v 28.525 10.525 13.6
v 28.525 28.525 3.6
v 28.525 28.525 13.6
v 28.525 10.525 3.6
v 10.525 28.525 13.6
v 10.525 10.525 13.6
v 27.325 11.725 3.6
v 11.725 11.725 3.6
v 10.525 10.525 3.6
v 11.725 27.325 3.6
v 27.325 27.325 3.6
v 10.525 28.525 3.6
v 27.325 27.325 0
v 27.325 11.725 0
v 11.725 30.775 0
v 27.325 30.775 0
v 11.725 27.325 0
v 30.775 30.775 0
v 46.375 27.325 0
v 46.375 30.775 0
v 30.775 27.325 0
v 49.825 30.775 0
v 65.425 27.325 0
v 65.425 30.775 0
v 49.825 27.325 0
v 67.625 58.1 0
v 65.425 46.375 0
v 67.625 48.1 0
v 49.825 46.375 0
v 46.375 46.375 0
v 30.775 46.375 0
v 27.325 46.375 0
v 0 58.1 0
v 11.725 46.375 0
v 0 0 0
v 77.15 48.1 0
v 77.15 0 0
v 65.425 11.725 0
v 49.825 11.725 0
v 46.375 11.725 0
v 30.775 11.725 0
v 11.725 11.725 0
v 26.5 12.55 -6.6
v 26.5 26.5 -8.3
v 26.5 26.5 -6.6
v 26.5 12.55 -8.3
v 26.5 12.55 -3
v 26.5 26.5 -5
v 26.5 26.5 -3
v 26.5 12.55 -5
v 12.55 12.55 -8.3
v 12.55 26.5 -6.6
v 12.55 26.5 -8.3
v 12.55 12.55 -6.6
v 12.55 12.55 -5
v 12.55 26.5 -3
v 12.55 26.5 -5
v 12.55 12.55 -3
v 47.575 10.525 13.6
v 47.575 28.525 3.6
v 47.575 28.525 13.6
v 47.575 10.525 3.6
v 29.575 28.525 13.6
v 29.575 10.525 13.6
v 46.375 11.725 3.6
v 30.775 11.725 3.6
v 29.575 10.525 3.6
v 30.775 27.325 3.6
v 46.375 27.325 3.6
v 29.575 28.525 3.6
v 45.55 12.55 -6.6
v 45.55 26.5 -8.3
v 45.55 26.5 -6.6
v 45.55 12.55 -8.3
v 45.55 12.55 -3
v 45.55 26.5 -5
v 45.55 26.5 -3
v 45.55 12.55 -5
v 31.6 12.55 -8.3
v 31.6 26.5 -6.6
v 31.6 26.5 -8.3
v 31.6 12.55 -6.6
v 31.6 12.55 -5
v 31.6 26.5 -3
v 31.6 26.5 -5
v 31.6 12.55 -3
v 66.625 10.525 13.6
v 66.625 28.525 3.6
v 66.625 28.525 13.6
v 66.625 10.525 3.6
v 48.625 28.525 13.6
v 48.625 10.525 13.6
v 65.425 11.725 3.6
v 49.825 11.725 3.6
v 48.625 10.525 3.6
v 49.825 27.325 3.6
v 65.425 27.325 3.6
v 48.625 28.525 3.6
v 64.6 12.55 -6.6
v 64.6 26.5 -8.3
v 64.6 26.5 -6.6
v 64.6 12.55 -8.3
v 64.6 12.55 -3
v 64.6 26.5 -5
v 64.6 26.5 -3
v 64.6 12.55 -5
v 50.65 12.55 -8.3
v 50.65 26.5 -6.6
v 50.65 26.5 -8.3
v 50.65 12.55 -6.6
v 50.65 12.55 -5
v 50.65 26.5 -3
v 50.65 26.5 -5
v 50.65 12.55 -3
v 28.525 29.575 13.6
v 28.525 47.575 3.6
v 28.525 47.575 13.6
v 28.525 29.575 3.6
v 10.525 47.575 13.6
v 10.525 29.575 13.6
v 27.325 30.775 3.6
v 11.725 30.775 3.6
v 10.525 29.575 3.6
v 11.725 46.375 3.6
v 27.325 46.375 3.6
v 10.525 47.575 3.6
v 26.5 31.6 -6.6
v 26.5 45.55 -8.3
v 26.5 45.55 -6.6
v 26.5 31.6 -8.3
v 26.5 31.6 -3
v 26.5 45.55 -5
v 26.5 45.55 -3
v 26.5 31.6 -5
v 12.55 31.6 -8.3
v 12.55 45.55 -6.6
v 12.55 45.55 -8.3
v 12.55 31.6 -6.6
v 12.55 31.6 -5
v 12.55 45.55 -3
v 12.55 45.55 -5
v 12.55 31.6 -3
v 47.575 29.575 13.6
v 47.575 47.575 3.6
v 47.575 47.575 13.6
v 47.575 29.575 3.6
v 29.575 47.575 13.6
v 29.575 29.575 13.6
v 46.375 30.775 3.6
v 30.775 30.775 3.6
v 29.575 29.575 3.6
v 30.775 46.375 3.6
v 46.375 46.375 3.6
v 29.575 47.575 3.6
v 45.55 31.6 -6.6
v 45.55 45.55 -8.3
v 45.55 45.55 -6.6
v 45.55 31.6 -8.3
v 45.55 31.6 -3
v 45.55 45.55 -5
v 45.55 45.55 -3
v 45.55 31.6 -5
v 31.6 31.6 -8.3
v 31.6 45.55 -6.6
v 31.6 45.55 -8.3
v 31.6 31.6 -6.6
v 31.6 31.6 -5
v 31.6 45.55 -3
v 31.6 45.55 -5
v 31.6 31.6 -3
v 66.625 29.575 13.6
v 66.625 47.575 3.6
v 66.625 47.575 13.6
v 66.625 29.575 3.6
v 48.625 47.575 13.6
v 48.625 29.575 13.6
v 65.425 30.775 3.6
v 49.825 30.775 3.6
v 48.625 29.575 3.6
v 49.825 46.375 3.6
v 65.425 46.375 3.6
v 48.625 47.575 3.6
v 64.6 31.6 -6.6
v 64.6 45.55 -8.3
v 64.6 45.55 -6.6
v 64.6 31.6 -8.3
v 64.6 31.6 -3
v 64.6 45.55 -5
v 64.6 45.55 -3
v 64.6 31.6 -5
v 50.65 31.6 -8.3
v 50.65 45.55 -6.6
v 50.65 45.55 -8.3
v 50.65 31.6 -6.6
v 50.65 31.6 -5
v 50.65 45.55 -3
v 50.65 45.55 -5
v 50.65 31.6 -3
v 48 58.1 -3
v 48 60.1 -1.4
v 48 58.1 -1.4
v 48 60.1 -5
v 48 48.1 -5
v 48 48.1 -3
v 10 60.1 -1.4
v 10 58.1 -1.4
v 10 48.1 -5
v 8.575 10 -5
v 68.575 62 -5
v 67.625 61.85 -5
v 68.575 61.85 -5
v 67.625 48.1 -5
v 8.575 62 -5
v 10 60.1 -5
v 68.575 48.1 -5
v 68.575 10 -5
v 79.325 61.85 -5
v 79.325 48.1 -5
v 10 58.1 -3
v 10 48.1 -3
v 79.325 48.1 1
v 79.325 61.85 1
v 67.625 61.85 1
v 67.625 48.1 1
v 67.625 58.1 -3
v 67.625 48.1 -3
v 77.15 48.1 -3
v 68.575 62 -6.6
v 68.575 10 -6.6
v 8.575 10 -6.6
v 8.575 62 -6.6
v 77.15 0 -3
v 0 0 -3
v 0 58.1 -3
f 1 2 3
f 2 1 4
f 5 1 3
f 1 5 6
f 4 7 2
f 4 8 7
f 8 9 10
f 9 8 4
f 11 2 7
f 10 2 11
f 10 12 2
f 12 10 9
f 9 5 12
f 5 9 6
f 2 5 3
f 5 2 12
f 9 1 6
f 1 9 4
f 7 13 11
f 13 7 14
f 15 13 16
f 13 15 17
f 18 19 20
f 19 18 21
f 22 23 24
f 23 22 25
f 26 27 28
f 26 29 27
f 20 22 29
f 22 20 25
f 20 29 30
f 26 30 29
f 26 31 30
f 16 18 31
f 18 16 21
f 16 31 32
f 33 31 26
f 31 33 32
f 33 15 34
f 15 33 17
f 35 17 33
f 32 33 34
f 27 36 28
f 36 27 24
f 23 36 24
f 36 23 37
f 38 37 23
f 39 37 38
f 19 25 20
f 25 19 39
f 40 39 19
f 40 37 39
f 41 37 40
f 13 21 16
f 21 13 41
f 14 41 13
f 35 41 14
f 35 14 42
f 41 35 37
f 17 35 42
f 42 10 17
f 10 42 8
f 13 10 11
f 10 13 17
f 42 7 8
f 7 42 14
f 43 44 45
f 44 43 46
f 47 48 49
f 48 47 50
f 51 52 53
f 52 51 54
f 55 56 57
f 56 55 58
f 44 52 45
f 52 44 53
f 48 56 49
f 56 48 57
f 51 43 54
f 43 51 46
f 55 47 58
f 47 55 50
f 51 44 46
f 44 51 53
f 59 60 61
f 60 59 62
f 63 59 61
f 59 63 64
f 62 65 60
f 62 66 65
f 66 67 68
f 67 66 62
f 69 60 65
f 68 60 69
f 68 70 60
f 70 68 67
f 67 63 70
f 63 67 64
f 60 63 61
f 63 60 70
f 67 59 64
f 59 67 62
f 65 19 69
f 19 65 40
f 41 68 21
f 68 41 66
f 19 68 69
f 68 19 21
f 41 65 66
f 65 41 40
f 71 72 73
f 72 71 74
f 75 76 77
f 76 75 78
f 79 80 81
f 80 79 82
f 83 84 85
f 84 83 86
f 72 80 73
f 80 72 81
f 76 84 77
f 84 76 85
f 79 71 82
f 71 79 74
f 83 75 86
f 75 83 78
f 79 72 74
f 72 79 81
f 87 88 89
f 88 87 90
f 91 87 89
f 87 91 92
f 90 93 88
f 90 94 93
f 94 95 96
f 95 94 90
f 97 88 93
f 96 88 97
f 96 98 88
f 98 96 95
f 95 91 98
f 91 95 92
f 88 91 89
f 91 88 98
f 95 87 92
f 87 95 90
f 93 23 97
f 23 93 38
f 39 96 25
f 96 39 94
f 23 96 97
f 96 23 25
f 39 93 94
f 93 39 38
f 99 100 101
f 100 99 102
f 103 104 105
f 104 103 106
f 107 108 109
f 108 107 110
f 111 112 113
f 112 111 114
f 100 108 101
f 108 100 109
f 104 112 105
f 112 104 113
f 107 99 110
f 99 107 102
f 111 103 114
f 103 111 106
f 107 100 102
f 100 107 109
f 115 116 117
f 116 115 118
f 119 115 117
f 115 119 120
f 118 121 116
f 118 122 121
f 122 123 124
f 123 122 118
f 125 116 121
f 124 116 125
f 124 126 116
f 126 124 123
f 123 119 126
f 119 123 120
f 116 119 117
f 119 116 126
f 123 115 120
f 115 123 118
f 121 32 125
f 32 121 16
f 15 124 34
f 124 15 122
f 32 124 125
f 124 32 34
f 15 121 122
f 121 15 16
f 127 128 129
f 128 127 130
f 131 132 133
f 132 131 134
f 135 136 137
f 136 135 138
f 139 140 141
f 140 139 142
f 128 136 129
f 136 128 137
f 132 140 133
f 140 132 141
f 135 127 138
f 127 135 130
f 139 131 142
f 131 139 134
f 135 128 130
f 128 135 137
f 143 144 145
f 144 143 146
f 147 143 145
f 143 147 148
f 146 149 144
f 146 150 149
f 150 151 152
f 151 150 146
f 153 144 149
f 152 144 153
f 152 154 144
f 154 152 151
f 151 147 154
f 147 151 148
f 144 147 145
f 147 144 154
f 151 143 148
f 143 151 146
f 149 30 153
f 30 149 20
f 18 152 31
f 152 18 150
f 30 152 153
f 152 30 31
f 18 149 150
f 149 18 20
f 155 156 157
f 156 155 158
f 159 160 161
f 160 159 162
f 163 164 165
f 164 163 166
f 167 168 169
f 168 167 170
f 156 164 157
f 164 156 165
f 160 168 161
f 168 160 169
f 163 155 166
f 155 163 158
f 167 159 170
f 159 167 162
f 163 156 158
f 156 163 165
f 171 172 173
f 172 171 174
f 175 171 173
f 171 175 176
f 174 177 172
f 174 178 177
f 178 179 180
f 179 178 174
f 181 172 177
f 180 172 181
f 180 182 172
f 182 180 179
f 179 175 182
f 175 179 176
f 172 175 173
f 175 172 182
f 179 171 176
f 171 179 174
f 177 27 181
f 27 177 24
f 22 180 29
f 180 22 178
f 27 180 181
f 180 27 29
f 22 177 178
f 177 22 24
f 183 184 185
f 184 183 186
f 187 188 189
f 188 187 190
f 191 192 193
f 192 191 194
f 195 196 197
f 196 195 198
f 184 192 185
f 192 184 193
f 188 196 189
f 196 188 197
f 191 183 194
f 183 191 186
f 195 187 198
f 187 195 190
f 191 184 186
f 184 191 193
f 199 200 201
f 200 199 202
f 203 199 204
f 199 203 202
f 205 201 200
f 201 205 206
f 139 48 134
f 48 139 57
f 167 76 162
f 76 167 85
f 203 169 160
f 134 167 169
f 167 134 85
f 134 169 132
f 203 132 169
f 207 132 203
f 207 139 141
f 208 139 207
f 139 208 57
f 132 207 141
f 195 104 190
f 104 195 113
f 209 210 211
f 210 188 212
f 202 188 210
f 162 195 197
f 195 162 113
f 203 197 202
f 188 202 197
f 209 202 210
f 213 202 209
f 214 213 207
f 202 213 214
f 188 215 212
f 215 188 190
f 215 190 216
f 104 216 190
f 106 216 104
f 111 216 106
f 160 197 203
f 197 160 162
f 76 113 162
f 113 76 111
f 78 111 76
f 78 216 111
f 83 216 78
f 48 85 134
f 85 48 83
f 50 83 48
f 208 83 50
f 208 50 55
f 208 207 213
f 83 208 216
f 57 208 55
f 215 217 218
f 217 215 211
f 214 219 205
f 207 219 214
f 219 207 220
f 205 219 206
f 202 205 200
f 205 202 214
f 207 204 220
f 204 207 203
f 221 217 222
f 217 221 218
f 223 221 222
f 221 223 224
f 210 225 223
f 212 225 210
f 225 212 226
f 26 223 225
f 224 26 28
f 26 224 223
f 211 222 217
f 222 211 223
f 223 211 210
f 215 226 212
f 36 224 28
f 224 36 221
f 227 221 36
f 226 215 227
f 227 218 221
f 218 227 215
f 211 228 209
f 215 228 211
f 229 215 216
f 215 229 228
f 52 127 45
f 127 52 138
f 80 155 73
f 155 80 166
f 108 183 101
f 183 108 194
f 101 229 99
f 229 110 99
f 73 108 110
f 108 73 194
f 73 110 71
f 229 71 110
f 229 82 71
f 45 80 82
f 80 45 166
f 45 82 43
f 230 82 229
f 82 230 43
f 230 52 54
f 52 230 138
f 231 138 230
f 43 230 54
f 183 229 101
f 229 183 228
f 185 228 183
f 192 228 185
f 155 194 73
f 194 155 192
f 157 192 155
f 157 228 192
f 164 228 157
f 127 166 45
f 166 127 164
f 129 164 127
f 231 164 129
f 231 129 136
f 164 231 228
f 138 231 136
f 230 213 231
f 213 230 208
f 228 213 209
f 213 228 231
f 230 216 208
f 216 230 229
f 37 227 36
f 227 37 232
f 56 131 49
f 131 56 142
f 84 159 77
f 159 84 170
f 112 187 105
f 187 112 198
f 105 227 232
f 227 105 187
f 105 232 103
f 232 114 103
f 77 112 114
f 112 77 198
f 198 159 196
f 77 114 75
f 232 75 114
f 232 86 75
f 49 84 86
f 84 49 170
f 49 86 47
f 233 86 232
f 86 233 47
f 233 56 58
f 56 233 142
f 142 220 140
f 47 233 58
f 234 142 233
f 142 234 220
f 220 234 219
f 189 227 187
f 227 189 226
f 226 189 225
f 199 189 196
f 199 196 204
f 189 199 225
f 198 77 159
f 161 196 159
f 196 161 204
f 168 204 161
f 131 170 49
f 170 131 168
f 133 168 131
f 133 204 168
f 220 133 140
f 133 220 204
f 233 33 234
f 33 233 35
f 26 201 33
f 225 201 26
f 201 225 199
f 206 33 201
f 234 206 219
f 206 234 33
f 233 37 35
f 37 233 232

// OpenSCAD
// file: ../../libs/flat-ui-colors.scad
flatui = [
    "#1abc9c",
    "#2ecc71",
    "#3498db",
    "#9b59b6",
    "#34495e",
    "#f1c40f",
    "#e67e22",
    "#e74c3c",
    "#ecf0f1",
    "#95a5a6",
];
// file: ../../libs/cherry-mx-switch.scad
/**
       Copyright 2016 Matthew Gaunt

   Licensed under the Apache License, Version 2.0 (the "License");
   you may not use this file except in compliance with the License.
   You may obtain a copy of the License at

       http://www.apache.org/licenses/LICENSE-2.0

   Unless required by applicable law or agreed to in writing, software
   distributed under the License is distributed on an "AS IS" BASIS,
   WITHOUT WARRANTIES OR CONDITIONS OF ANY KIND, either express or implied.
   See the License for the specific language governing permissions and
   limitations under the License.
**/

nothing=0.01; // See https://3dprinting.stackexchange.com/questions/9794/how-to-prevent-z-fighting-in-openscad

topH = 6.6;
topXY = 15.6;

innerH = 5;
innerXY = 13.95;

pinH = 3.3;

keycapSpaceXY = 18;
keycapSpaceH = 10;

cherrymxSpace = 19.05;
cherrymxPCBZ = innerH;

module cmPlate() {
    union() {
        translate([0, 0, topH / 2])
        color("#0be881") cube([innerXY, innerXY, topH], center=true);
        
        translate([0, 0, -2.5])
        color("#ffc048") cube([innerXY, innerXY, innerH + nothing], center=true);
        
        translate([0, 0, -(innerH + (pinH / 2))])
        color("#ffdd59") cube([innerXY, innerXY, pinH + nothing], center=true);
    }
}

module cmSwitch() {
    union() {
        // 3.6 here is the height of the stem
        translate([0, 0, (keycapSpaceH / 2) + 3.6])
        color("#00a8ff99") cube([keycapSpaceXY, keycapSpaceXY, keycapSpaceH], center=true);
        
        translate([0, 0, topH / 2])
        color("#ef5777") cube([topXY, topXY, topH], center=true);
        
        translate([0, 0, -(innerH / 2)])
        color("#575fcf") cube([innerXY, innerXY, innerH], center=true);
        
        translate([0, 0, -(innerH + (pinH / 2))])
        color("#4bcffa") cube([innerXY, innerXY, pinH], center=true);
        
    }
}

module cherrymx(cutout) {
    if (cutout) {
        cmPlate();
    } else {
        cmSwitch();
    }
}

// cherrymx(true);   // cutout / plate
// cherrymx(false);  // full switch / part
// main file
include <../../libs/cherry-mx-switch.scad>;
include <../../libs/flat-ui-colors.scad>;

thickness = 3;

keyCols = 3;
keyRows = 2;
keyPadding = 0;
keyOffset = topXY + keyPadding;

pcbX = 60;
pcbY = 52;
pcbZ = 1.6;

screenX = 38;
screenY = 12;
screenZ = 3.6;

mpXPadding = 10;
mpYPadding = 10;
mpX = (cherrymxSpace * keyCols) + (mpXPadding * 2);
mpY = (cherrymxSpace * keyRows) + (mpYPadding * 2);

module cherrymxCols(cutout = false) {
    for (i = [0:keyCols - 1]) {
        o = cherrymxSpace * i;
        translate([o, 0, 0]) cherrymx(cutout);
    }
}

module cherrymxRows(cutout = false) {
    for (i = [0:keyRows - 1]) {
        o = cherrymxSpace * i;
        translate([0, o, 0]) cherrymxCols(cutout);
    }
}

module cherrymxKeys(cutout = false) {
    translate([cherrymxSpace / 2, cherrymxSpace / 2, 0])
    cherrymxRows(cutout);
}

module screen() {
    translate([mpXPadding, (cherrymxSpace * keyRows) + mpYPadding , -cherrymxPCBZ])
    color(flatui[5]) cube([screenX, screenY, screenZ]);
}

module rotaryEncoder() {
    translate([mpX - (cherrymxSpace / 2), (cherrymxSpace * keyRows) + mpYPadding , -cherrymxPCBZ])
    cube([11.7, 13.75, 6]);
}

module pcb() {
    translate([(mpX - pcbX) / 2, mpYPadding, -cherrymxPCBZ - pcbZ])
    color(flatui[3]) cube([pcbX, pcbY, pcbZ]);
}

module parts(cutout=false) {
    translate([mpXPadding, mpYPadding, 0]) cherrymxKeys(cutout);
    
    screen();
    
    rotaryEncoder();
    
    pcb();
}

module switchPlateLayer() {
    translate([0, 0, -thickness])
    color(flatui[4]) cube([mpX, mpY, thickness]);
}

module middleLayers() {
    translate([0, 0, -(2 * thickness)])
    color(flatui[5]) cube([mpX, mpY, thickness]);
    
    translate([0, 0, -(3 * thickness)])
    color(flatui[6]) cube([mpX, mpY, thickness]);
    
    translate([0, 0, -(4 * thickness)])
    color(flatui[7]) cube([mpX, mpY, thickness]);
    
    translate([0, 0, -(5 * thickness)])
    color(flatui[8]) cube([mpX, mpY, thickness]);
}

module baseLayer() {
    translate([0, 0, -(6 * thickness)])
    color(flatui[9]) cube([mpX, mpY, thickness]);
}

module plates() {
    switchPlateLayer();
    // middleLayers();
    // baseLayer();
}

parts(false);
plates();
